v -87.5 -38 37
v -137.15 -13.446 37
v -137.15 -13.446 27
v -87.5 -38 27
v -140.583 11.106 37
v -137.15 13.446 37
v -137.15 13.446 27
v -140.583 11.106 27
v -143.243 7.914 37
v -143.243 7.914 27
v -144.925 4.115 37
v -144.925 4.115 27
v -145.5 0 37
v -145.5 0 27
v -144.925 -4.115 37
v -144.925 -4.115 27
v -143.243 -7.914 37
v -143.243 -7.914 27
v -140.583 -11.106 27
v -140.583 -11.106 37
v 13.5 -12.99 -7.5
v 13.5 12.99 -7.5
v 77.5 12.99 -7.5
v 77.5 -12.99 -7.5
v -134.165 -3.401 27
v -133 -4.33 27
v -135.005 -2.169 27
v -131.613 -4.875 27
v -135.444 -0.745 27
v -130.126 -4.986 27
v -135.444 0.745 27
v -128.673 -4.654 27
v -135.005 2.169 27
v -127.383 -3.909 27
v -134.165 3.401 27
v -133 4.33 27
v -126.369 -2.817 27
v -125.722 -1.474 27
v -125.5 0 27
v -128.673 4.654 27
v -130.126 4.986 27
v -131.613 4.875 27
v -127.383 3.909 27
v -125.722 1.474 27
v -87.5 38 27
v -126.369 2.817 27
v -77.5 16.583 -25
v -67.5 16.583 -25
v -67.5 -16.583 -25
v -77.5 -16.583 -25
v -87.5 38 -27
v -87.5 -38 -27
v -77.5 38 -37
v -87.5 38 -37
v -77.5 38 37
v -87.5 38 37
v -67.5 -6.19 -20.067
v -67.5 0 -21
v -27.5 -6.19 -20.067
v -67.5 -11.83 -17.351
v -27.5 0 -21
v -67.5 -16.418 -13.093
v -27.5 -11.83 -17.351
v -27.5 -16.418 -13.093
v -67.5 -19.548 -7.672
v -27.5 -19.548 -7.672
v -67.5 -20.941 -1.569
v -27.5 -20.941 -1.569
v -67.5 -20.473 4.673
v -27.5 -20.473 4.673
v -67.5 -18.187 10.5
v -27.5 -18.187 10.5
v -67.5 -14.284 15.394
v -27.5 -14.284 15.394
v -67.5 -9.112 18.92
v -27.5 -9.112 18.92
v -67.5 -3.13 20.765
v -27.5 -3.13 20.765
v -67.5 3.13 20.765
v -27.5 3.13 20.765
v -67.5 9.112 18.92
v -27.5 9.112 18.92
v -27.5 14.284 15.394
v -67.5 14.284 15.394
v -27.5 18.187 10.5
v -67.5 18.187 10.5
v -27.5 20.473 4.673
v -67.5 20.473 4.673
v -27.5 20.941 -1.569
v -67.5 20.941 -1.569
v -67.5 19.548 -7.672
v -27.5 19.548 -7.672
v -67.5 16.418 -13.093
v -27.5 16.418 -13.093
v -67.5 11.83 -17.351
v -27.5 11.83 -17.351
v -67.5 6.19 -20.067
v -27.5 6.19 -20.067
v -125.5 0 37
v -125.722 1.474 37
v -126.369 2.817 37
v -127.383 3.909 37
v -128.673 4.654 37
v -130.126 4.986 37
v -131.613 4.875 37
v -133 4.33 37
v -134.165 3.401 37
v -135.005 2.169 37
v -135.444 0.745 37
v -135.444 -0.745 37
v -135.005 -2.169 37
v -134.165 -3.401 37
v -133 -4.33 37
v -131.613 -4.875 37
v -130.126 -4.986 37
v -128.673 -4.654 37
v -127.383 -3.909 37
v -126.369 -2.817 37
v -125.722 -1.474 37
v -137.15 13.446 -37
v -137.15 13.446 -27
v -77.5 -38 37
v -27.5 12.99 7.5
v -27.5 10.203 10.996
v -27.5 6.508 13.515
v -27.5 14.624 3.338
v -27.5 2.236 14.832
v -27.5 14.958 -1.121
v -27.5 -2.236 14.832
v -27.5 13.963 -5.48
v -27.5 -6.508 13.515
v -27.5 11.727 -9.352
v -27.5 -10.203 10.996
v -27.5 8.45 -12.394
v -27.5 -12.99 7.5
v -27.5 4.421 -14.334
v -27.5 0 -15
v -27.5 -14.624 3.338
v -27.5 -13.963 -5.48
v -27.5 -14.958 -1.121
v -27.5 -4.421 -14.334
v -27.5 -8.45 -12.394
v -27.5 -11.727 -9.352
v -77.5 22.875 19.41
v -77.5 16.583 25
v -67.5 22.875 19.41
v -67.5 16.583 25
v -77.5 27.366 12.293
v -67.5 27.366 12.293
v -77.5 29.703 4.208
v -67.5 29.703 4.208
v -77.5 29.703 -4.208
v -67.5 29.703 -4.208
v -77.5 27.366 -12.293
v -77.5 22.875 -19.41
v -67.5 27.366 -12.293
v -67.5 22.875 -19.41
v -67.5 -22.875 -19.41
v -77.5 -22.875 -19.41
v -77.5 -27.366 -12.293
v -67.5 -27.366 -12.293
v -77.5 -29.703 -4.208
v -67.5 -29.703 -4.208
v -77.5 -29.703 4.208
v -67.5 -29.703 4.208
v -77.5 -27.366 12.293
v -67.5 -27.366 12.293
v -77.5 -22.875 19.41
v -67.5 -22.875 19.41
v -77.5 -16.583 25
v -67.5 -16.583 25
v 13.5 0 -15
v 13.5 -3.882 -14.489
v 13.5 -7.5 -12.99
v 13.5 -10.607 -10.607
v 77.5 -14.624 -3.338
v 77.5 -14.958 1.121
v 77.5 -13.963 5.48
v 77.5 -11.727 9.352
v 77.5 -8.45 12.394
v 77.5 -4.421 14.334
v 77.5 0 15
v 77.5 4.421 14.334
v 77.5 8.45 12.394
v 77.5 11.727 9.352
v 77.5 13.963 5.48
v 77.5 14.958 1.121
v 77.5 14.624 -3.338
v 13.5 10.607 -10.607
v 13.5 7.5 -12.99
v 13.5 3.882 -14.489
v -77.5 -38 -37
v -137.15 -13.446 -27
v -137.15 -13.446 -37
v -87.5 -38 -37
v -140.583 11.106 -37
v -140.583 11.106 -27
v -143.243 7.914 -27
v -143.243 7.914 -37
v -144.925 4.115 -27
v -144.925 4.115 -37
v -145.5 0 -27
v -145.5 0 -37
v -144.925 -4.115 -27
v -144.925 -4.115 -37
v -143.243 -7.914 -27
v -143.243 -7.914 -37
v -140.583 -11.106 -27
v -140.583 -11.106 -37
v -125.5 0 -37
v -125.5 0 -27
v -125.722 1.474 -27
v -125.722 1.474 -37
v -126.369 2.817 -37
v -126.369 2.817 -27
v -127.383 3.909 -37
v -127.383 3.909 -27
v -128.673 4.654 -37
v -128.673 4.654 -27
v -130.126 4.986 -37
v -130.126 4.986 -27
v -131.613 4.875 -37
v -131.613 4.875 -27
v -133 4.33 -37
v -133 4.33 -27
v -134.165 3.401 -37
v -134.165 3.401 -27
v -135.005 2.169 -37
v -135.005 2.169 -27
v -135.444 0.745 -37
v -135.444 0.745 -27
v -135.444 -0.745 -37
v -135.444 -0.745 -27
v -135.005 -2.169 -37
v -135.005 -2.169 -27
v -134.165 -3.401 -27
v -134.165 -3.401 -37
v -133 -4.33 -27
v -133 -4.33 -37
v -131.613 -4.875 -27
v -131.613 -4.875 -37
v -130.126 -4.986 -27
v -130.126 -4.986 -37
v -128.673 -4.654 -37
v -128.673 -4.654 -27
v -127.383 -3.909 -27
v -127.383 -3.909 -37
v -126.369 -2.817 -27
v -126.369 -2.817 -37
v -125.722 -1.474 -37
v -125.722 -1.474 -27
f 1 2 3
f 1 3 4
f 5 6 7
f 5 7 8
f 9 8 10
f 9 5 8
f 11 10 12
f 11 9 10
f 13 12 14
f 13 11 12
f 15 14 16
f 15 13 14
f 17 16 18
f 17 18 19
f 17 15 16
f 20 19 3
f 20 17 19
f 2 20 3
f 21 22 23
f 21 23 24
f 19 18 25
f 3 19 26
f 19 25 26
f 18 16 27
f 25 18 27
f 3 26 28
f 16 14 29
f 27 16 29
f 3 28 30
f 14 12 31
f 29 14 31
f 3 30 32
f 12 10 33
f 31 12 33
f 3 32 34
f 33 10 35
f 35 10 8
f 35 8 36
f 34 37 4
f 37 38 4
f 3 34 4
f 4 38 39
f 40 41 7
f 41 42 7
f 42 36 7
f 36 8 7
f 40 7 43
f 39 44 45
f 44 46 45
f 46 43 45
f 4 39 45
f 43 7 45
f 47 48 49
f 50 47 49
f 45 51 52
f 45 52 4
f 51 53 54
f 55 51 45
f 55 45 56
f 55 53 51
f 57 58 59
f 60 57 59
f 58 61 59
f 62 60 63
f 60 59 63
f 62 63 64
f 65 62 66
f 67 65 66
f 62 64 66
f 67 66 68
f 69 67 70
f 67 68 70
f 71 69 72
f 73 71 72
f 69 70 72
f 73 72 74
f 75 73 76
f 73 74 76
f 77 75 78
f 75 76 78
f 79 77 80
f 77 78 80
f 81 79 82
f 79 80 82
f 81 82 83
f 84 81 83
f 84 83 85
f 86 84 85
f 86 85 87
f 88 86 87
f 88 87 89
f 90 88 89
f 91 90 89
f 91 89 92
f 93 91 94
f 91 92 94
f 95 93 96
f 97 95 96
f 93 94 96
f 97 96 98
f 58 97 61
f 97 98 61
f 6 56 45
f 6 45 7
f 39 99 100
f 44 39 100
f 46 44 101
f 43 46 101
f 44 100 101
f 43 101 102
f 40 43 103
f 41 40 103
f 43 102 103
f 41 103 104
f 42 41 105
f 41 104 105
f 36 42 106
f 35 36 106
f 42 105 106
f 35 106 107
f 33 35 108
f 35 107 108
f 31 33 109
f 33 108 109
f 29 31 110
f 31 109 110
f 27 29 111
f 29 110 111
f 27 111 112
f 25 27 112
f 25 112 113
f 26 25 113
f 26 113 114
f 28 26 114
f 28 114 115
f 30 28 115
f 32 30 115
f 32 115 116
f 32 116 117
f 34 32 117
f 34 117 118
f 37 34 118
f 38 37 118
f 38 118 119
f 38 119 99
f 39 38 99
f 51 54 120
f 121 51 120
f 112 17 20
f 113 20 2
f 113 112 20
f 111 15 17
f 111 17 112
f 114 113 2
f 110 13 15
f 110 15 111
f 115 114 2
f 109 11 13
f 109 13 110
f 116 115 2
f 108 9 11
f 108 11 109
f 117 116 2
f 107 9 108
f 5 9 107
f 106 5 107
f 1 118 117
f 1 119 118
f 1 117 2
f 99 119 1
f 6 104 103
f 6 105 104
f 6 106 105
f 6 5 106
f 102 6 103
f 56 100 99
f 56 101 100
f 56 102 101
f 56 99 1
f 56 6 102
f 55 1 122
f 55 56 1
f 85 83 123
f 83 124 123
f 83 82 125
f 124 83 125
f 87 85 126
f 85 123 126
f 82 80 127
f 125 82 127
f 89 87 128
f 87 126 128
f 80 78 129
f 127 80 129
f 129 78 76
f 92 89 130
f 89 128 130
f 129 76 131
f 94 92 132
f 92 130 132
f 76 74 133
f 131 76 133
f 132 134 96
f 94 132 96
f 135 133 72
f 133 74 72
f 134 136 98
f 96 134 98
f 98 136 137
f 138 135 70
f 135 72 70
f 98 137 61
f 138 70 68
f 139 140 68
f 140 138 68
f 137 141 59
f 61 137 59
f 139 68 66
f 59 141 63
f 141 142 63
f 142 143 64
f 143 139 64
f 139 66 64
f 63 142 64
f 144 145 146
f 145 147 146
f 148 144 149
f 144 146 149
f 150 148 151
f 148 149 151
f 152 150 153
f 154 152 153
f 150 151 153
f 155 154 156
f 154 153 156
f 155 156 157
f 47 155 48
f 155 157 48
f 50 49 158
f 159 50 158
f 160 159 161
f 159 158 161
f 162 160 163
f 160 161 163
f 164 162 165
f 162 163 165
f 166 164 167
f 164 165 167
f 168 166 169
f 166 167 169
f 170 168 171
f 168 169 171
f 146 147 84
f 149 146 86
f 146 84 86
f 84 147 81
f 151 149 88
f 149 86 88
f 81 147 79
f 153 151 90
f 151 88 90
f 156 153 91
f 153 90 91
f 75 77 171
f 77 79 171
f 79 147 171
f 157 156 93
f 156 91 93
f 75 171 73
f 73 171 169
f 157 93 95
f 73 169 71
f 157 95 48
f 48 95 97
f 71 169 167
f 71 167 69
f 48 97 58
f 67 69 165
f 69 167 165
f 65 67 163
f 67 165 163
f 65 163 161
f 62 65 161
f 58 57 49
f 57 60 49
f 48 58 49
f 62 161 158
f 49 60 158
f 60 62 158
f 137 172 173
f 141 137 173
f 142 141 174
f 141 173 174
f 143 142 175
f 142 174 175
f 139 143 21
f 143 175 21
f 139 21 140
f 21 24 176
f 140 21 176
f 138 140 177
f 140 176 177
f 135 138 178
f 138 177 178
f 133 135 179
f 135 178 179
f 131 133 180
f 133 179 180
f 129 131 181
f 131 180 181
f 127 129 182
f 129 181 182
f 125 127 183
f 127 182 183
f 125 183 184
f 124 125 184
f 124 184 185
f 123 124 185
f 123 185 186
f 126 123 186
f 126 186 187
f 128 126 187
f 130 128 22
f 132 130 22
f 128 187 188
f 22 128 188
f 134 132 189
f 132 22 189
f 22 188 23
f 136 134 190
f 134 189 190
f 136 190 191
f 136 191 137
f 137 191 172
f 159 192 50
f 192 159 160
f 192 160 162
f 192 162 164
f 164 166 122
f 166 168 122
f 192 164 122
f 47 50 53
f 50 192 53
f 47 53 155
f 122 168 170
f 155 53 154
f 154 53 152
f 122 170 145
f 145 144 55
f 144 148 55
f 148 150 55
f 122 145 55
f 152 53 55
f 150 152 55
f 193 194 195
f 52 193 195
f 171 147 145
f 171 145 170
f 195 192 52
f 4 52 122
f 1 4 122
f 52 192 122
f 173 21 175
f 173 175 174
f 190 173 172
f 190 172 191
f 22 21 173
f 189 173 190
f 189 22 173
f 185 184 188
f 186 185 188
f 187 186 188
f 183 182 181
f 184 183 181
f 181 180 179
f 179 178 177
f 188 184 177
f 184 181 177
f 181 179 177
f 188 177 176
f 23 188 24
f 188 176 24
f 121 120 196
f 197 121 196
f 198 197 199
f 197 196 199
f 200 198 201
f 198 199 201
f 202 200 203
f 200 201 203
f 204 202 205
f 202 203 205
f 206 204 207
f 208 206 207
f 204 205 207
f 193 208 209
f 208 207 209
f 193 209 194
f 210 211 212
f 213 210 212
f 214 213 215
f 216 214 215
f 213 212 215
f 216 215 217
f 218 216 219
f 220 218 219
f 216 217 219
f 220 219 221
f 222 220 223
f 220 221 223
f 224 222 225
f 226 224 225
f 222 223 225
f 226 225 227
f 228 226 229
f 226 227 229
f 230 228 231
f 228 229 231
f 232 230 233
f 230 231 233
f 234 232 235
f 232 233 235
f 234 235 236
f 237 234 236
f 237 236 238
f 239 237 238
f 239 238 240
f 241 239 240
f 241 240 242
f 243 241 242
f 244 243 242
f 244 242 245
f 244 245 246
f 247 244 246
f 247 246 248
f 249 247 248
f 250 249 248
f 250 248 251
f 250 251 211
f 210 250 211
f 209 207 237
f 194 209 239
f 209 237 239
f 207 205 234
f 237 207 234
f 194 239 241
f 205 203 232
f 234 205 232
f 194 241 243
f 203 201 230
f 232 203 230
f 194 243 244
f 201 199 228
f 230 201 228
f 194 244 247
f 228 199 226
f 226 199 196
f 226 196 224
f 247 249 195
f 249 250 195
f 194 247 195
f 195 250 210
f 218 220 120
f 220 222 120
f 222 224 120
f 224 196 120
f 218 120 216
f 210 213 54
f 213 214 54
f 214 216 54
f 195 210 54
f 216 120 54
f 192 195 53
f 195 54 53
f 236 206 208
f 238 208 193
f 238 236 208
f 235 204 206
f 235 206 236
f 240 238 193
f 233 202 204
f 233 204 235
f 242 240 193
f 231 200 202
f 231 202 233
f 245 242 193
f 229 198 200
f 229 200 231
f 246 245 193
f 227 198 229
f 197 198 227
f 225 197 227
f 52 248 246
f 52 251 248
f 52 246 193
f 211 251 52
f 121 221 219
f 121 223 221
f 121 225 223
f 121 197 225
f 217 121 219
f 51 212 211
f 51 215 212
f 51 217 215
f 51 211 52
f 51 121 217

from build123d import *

# Parameters (mm, degrees)
SKETCH2_W           = 74
SKETCH2_H           = 76
BOSS_EXTRUDE1_DEPTH = 10
BOSS_EXTRUDE2_DEPTH = 10
HOLE1_D             = 10
CUT_EXTRUDE1_START  = -145
CUT_EXTRUDE1_DEPTH  = 10
CUT_EXTRUDE2_DEPTH  = 64


with BuildPart() as part:
    # Sketch1 → Revolve1 (revolve)
    with BuildSketch(Plane.XY, mode=Mode.PRIVATE) as revolve1_sk:
        Polygon((-77.5, 0), (-77.5, 30), (-67.5, 30), (-67.5, 21), (-27.5, 21), (-27.5, 15), (77.5, 15), (77.5, 0), align=None)
    revolve(revolve1_sk.sketch.rotate(Axis((77.5, 0, 0), (-1, 0, 0)), 90), axis=Axis((77.5, 0, 0), (-1, 0, 0)))

    # Sketch2 → Boss-Extrude1 (add)
    with BuildSketch(Plane.ZY.offset(77.5)):
        Rectangle(SKETCH2_W, SKETCH2_H)
    extrude(amount=BOSS_EXTRUDE1_DEPTH)

    # Sketch3 → Boss-Extrude2 (add)
    with BuildSketch(Plane(origin=(0, 0, -37), x_dir=(-1, 0, 0), z_dir=(0, 0, -1))):
        with BuildLine():
            Line((87.5, 38), (137.149569367, 13.445565337))
            ThreePointArc((137.149569367, 13.445565337), (145.5, 0), (137.149569367, -13.445565337))
            Line((137.149569367, -13.445565337), (87.5, -38))
            Line((87.5, -38), (77.5, -38))
            Line((77.5, -38), (77.5, 38))
            Line((77.5, 38), (87.5, 38))
        make_face()
    boss_extrude2 = extrude(amount=-BOSS_EXTRUDE2_DEPTH)

    # Mirror1: Boss-Extrude2 across plane
    add(boss_extrude2.mirror(Plane.XY))

    # Hole1 (through all)
    with Locations(Plane(origin=(0, 0, -37), x_dir=(-1, 0, 0), z_dir=(0, 0, -1))):
        with Locations((130.5, 0)):
            Hole(HOLE1_D / 2)

    # Sketch8 → Cut-Extrude1 (cut)
    with BuildSketch(Plane(origin=(77.5, 0, 0), x_dir=(0, 0, -1), z_dir=(1, 0, 0)).offset(CUT_EXTRUDE1_START)):
        with BuildLine():
            Line((25, 16.583123952), (25, -16.583123952))
            ThreePointArc((25, -16.583123952), (30, 0), (25, 16.583123952))
        make_face()
        with BuildLine():
            Line((-25, 16.583123952), (-25, -16.583123952))
            ThreePointArc((-25, -16.583123952), (-30, 0), (-25, 16.583123952))
        make_face()
    extrude(amount=-CUT_EXTRUDE1_DEPTH, mode=Mode.SUBTRACT)

    # Sketch9 → Cut-Extrude2 (cut)
    with BuildSketch(Plane(origin=(77.5, 0, 0), x_dir=(0, 0, -1), z_dir=(1, 0, 0))):
        with BuildLine():
            Line((7.5, 12.990381057), (7.5, -12.990381057))
            ThreePointArc((7.5, -12.990381057), (15, 0), (7.5, 12.990381057))
        make_face()
    extrude(amount=-CUT_EXTRUDE2_DEPTH, mode=Mode.SUBTRACT)


solid = part.part
